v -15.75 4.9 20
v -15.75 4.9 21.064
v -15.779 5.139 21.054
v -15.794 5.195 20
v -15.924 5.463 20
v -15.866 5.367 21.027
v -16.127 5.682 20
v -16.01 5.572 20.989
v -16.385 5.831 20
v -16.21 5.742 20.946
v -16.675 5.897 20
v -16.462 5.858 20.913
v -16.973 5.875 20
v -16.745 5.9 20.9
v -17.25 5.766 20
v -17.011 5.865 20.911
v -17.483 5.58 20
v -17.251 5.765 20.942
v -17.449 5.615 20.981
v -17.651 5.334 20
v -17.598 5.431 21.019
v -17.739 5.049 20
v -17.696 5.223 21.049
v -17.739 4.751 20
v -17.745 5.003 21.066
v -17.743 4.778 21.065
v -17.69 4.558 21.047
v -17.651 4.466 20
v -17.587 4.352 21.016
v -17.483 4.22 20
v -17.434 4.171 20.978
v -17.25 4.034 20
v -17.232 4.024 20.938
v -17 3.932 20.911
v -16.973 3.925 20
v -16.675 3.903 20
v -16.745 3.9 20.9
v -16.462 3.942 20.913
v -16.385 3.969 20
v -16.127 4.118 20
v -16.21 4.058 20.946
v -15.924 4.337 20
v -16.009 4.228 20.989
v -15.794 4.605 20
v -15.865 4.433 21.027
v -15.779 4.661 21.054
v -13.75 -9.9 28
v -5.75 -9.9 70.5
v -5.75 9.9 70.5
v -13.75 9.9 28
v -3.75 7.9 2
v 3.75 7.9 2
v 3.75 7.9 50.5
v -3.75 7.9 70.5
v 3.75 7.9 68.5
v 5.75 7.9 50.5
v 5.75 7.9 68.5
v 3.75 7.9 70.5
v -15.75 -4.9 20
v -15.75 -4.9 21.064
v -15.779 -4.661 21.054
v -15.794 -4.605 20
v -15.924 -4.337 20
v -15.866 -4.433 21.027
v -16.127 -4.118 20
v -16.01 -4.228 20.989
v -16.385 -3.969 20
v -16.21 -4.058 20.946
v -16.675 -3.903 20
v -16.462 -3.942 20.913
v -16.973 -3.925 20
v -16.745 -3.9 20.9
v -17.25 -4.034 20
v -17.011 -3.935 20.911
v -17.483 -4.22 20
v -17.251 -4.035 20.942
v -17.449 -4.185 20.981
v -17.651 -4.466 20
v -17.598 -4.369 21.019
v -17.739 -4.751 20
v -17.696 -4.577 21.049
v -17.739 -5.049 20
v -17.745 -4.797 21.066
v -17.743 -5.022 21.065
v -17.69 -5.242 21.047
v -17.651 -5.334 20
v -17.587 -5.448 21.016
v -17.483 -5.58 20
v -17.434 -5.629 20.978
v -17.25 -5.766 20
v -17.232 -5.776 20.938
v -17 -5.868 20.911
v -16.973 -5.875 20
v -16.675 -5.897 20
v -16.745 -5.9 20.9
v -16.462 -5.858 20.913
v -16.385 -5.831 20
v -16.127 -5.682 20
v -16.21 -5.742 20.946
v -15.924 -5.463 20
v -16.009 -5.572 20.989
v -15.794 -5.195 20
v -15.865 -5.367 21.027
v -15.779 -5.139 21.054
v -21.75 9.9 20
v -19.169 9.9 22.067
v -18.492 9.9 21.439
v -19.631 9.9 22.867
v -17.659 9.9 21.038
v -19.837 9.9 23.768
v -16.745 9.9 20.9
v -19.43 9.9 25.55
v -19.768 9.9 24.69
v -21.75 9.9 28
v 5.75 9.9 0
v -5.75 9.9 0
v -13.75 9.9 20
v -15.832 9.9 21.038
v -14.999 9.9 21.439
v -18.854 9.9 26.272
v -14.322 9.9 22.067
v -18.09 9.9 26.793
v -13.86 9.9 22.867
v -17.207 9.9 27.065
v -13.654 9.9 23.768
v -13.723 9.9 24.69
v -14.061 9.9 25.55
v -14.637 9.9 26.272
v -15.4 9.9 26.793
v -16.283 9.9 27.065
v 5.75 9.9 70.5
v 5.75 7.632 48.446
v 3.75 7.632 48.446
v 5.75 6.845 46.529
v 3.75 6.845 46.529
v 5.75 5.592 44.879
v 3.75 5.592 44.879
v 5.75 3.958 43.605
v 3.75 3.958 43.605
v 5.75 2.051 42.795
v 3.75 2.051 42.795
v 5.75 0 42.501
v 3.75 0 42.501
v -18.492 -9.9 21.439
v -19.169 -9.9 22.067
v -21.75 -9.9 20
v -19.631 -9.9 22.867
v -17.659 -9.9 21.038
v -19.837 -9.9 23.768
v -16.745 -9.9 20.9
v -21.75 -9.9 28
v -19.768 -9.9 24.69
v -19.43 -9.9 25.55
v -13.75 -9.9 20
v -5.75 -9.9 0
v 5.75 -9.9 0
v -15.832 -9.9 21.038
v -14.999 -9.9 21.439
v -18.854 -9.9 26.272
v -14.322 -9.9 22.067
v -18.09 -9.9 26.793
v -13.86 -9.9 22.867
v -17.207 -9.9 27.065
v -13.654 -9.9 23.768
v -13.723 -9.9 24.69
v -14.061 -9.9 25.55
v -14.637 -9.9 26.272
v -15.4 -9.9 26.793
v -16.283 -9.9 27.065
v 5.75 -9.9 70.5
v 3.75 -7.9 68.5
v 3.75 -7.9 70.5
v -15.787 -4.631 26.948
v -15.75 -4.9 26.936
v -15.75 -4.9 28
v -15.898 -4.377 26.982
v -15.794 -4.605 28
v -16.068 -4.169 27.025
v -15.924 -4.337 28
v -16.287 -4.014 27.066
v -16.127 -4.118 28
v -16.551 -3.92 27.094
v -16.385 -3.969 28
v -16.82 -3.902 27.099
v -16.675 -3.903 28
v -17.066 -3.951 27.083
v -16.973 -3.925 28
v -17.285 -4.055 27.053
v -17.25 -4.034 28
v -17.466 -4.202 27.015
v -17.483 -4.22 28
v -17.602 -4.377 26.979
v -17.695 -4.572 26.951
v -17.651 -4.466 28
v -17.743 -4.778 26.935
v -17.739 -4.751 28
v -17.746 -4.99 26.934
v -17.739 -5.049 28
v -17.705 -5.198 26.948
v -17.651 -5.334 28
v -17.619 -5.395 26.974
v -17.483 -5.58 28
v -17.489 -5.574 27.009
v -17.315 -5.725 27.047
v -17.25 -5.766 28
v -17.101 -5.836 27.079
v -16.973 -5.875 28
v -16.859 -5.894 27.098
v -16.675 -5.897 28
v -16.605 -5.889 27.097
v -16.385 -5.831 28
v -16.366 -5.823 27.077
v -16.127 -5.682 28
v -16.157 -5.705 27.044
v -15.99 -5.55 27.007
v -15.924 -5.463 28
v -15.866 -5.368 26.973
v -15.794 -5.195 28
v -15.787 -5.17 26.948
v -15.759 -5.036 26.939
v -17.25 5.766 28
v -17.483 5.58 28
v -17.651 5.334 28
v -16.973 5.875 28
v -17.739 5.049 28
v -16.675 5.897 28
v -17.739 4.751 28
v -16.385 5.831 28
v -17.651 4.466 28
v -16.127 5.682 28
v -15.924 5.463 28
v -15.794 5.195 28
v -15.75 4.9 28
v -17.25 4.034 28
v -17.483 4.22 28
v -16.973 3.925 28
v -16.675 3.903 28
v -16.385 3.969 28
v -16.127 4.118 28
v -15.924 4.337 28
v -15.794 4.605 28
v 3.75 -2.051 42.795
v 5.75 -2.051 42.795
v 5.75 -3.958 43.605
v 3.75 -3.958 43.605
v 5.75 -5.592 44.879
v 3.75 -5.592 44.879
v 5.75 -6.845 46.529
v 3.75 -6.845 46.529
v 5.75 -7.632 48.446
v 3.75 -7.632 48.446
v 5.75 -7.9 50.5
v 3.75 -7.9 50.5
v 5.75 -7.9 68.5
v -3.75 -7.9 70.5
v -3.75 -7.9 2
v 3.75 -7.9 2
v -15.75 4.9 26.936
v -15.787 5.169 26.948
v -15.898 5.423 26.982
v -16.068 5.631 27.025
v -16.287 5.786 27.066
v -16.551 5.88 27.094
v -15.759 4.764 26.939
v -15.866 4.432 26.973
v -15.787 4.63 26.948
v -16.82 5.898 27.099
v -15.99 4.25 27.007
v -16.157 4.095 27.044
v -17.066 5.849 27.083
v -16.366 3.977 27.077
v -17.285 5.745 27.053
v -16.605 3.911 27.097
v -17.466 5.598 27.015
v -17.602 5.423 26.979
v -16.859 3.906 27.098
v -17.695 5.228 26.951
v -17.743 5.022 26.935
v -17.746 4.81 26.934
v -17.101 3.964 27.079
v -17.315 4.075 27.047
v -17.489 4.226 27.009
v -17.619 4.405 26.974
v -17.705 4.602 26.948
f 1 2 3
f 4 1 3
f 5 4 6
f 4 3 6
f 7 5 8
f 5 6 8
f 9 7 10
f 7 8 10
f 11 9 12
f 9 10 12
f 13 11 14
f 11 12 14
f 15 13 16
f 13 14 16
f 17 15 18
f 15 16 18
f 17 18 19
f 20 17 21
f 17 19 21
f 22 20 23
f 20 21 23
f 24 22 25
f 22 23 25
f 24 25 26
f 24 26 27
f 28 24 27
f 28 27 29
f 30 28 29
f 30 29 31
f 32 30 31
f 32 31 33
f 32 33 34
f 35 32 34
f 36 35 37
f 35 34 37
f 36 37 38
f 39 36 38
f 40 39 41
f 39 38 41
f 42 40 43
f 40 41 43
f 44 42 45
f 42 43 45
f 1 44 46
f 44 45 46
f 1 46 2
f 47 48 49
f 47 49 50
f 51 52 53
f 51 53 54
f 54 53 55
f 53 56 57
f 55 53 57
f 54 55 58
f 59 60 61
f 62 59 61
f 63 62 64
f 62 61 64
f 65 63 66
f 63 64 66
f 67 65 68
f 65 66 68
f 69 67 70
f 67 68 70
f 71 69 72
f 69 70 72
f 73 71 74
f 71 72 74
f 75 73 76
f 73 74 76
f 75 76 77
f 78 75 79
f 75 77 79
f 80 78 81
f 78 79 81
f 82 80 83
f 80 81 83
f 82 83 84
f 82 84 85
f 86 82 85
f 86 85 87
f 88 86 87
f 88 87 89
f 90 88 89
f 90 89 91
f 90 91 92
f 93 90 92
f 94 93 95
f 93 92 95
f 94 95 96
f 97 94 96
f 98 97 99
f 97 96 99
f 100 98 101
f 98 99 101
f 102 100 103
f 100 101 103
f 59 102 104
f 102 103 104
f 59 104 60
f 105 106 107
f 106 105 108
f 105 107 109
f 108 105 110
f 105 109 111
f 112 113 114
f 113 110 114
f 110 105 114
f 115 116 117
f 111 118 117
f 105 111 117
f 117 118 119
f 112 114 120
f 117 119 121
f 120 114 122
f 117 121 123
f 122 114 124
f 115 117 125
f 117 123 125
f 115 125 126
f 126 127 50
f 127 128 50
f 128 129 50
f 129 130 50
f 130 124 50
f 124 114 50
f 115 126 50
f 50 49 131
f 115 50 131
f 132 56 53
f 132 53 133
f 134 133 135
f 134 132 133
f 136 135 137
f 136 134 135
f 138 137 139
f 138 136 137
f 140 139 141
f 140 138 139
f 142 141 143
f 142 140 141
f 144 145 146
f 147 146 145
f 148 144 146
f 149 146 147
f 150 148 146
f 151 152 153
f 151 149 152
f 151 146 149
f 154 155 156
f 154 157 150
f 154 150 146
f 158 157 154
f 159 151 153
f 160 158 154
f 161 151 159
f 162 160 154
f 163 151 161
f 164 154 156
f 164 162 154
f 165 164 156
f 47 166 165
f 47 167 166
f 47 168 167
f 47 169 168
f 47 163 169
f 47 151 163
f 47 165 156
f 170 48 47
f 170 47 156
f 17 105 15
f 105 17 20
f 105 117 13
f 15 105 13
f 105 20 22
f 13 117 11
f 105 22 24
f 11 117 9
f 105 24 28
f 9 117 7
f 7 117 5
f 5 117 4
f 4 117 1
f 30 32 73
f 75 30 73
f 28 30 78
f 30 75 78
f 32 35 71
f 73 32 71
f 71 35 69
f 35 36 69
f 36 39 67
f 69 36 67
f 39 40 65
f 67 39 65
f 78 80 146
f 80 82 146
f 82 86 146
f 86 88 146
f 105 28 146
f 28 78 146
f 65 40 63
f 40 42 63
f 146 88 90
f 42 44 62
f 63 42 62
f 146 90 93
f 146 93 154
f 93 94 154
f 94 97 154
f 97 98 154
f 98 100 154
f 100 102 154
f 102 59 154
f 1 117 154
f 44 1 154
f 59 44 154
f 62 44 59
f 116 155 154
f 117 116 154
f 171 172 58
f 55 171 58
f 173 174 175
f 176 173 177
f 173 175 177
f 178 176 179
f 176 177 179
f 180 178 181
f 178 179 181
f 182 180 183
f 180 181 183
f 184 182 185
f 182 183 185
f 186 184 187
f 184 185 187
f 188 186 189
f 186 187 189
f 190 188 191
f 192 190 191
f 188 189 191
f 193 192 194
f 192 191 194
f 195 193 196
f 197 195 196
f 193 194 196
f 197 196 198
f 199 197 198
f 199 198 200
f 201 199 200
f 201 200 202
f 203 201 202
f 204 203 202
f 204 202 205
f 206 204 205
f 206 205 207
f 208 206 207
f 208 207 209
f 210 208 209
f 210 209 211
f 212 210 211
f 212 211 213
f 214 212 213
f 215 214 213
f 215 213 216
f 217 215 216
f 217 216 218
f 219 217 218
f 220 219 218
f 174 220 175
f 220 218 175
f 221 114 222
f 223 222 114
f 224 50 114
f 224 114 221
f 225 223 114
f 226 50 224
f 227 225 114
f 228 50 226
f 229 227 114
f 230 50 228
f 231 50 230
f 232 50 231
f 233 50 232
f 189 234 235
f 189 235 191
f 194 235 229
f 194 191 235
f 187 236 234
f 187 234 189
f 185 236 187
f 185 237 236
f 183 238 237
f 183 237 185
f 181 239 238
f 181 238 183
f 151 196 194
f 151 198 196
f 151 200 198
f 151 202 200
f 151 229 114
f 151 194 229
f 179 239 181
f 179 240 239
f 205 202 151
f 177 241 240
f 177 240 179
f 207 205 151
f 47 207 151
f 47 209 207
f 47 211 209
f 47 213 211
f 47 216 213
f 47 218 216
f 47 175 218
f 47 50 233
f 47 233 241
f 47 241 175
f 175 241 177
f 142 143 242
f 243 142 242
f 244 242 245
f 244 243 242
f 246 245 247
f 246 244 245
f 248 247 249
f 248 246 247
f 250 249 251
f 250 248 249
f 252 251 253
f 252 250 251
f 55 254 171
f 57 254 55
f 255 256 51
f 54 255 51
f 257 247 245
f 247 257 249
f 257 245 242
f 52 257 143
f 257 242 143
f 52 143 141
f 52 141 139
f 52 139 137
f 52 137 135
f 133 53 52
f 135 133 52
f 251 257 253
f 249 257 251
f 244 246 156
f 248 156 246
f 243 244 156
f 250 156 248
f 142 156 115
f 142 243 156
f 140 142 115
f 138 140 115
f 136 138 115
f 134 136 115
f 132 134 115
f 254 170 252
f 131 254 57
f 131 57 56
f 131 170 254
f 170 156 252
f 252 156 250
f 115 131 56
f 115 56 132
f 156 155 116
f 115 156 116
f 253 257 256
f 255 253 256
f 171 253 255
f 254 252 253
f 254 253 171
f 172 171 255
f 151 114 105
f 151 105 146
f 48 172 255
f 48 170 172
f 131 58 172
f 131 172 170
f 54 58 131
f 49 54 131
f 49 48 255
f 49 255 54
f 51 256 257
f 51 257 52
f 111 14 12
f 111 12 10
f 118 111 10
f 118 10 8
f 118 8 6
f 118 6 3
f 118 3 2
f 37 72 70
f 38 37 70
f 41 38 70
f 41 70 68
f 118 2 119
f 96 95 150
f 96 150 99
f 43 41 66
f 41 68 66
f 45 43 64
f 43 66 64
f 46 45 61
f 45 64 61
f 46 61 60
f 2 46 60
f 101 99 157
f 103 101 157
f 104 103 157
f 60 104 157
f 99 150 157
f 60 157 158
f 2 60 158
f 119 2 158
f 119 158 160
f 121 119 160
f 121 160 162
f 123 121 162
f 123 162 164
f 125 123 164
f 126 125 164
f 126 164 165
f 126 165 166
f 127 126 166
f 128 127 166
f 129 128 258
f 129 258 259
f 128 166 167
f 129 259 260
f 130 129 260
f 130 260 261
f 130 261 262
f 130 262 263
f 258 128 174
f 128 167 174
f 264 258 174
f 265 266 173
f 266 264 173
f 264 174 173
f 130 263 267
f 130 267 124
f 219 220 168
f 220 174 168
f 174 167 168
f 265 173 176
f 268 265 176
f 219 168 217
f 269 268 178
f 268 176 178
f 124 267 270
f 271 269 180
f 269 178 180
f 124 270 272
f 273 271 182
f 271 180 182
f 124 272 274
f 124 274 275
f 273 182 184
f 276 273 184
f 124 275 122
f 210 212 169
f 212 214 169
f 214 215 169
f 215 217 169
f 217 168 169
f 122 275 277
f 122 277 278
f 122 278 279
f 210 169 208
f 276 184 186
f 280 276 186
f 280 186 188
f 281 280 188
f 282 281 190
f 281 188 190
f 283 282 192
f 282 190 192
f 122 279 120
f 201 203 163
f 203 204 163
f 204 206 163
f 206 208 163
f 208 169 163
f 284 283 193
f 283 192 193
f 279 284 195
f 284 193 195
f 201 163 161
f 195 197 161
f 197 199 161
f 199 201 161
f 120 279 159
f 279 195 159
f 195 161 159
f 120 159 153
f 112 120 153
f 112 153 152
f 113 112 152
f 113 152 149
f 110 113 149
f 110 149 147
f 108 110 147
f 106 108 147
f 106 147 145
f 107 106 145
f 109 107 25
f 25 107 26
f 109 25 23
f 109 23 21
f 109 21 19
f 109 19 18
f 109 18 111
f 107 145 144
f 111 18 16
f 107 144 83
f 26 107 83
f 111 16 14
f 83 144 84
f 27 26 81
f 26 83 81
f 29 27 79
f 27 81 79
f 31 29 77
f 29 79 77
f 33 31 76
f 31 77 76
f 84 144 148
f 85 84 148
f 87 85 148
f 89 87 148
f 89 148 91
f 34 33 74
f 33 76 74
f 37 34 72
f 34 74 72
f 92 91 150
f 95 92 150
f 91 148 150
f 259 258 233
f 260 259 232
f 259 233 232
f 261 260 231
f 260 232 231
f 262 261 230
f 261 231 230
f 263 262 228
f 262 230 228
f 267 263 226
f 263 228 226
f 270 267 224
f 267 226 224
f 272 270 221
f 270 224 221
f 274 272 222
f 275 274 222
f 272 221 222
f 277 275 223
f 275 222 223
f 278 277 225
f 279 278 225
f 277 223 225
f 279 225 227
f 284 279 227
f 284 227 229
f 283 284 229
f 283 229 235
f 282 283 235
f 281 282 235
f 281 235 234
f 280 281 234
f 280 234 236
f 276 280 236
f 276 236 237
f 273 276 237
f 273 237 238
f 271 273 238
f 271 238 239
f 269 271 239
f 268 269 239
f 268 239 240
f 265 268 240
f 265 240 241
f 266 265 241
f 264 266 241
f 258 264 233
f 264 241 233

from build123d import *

# Parameters (mm, degrees)
CROQUIS1_W              = 19.8
CROQUIS1_H              = 11.5
SALIENTE_EXTRUIR1_DEPTH = 70.5
VACIADO1_T              = -2
CROQUIS4_W              = 15.8
CROQUIS4_H              = 28
CORTAR_EXTRUIR1_DEPTH   = 2
REDONDEO1_R             = 8
CROQUIS5_W              = 15.8
CROQUIS5_H              = 2
SALIENTE_EXTRUIR2_DEPTH = 2
CROQUIS6_W              = 19.8
CROQUIS6_H              = 8
SALIENTE_EXTRUIR4_DEPTH = 16
CROQUIS8_R              = 1
CORTAR_EXTRUIR3_DEPTH   = 10
SALIENTE_EXTRUIR5_DEPTH = 19.8
CROQUIS10_R             = 3.1
CORTAR_EXTRUIR4_DEPTH   = 19.8


with BuildPart() as part:
    # Croquis1 → Saliente-Extruir1 (new body)
    with BuildSketch(Plane(origin=(0, 0, 0), x_dir=(0, 1, 0), z_dir=(0, 0, 1))):
        Rectangle(CROQUIS1_W, CROQUIS1_H)
    extrude(amount=SALIENTE_EXTRUIR1_DEPTH)

    # Vaciado1
    vaciado1_openings = [part.faces().sort_by_distance(p)[0] for p in [
        (0, 0, 70.5),
    ]]
    offset(amount=VACIADO1_T, openings=vaciado1_openings, kind=Kind.INTERSECTION)

    # Croquis4 → Cortar-Extruir1 (cut)
    with BuildSketch(Plane.YZ.offset(5.75)):
        with Locations((0, 56.5)):
            Rectangle(CROQUIS4_W, CROQUIS4_H)
    extrude(amount=-CORTAR_EXTRUIR1_DEPTH, mode=Mode.SUBTRACT)

    # Redondeo1
    # the kernel refuses this fillet: 8 mm, written as the material it adds along each edge
    with BuildSketch(Plane(origin=(5.75, 7.9, 42.5), x_dir=(0, -1, 0), z_dir=(-1, 0, 0)), Plane(origin=(5.75, -7.9, 42.5), x_dir=(0, 0, 1), z_dir=(-1, 0, 0))) as redondeo1_piece_1:
        with BuildLine():
            CenterArc((REDONDEO1_R, REDONDEO1_R), REDONDEO1_R, 180, 90)
            Line((0, REDONDEO1_R), (0, 0))
            Line((0, 0), (REDONDEO1_R, 0))
        make_face()
    extrude(amount=2)

    # Croquis5 → Saliente-Extruir2 (add)
    with BuildSketch(Plane.YZ.offset(5.75)):
        with Locations((0, 69.5)):
            Rectangle(CROQUIS5_W, CROQUIS5_H)
    extrude(amount=-SALIENTE_EXTRUIR2_DEPTH)

    # Croquis6 → Saliente-Extruir4 (add)
    with BuildSketch(Plane(origin=(-5.75, 0, 0), x_dir=(0, -1, 0), z_dir=(-1, 0, 0))):
        with Locations((0, 24)):
            Rectangle(CROQUIS6_W, CROQUIS6_H)
    extrude(amount=SALIENTE_EXTRUIR4_DEPTH)

    # Croquis8 → Cortar-Extruir3 (cut)
    with BuildSketch(Plane.XY.offset(28)):
        with Locations((-16.75, 4.9)):
            Circle(CROQUIS8_R)
        with Locations((-16.75, -4.9)):
            Circle(CROQUIS8_R)
    extrude(amount=-CORTAR_EXTRUIR3_DEPTH, mode=Mode.SUBTRACT)

    # Croquis9 → Saliente-Extruir5 (add)
    with BuildSketch(Plane.XZ.offset(9.9)):
        Polygon((-5.75, 70.5), (-13.75, 28), (-5.75, 28), align=None)
        Polygon((-5.75, 0), (-13.75, 20), (-5.75, 20), align=None)
    extrude(amount=-SALIENTE_EXTRUIR5_DEPTH)

    # Croquis10 → Cortar-Extruir4 (cut)
    with BuildSketch(Plane.XZ.offset(9.9)):
        with Locations(Location((-16.745253682, 24, 0), (0, 0, 270))):
            Circle(CROQUIS10_R)
    extrude(amount=-CORTAR_EXTRUIR4_DEPTH, mode=Mode.SUBTRACT)


solid = part.part
